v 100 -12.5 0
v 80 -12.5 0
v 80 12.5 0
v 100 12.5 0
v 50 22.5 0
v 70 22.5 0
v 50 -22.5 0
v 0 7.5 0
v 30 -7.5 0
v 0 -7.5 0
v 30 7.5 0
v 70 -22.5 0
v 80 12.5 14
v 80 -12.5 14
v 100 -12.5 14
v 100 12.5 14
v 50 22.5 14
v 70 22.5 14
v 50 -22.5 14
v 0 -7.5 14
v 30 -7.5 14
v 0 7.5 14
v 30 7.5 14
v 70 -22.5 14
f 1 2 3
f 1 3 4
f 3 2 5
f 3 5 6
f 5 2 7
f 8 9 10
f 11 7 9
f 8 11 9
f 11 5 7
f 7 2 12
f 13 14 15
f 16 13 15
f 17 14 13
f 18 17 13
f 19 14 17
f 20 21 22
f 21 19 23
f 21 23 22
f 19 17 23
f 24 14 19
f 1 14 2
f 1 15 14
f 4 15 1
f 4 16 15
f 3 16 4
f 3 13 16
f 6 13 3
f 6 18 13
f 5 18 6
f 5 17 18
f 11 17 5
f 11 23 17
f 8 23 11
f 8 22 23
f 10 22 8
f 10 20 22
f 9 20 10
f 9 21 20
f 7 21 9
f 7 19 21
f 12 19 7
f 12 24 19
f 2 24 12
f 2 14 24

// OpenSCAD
// Racing Car Body

// model parameters
d1 = 30;
d2 = 20;
d3 = 20;
d4 = 10;
d5 = 20;

w1 = 15;
w2 = 45;
w3 = 25;

h1 = 14;

// define points
p1 = [0, -w1/2];
p2 = [d1,-w1/2];
p3 = [d1+d2, -w2/2];
p4 = [d1+d2+d3, -w2/2];
p5 = [d1+d2+d3+d4, -w3/2];
p6 = [d1+d2+d3+d4+d5, -w3/2];

p12 = [0, w1/2];
p11 = [d1,w1/2];
p10 = [d1+d2, w2/2];
p9 = [d1+d2+d3, w2/2];
p8 = [d1+d2+d3+d4, w3/2];
p7 = [d1+d2+d3+d4+d5, w3/2];

// all points
points = [p1, p2, p3, p4, p5, p6, p7, p8, p9, p10, p11, p12];

// extruded body profile
linear_extrude(height=h1)
    polygon(points);
